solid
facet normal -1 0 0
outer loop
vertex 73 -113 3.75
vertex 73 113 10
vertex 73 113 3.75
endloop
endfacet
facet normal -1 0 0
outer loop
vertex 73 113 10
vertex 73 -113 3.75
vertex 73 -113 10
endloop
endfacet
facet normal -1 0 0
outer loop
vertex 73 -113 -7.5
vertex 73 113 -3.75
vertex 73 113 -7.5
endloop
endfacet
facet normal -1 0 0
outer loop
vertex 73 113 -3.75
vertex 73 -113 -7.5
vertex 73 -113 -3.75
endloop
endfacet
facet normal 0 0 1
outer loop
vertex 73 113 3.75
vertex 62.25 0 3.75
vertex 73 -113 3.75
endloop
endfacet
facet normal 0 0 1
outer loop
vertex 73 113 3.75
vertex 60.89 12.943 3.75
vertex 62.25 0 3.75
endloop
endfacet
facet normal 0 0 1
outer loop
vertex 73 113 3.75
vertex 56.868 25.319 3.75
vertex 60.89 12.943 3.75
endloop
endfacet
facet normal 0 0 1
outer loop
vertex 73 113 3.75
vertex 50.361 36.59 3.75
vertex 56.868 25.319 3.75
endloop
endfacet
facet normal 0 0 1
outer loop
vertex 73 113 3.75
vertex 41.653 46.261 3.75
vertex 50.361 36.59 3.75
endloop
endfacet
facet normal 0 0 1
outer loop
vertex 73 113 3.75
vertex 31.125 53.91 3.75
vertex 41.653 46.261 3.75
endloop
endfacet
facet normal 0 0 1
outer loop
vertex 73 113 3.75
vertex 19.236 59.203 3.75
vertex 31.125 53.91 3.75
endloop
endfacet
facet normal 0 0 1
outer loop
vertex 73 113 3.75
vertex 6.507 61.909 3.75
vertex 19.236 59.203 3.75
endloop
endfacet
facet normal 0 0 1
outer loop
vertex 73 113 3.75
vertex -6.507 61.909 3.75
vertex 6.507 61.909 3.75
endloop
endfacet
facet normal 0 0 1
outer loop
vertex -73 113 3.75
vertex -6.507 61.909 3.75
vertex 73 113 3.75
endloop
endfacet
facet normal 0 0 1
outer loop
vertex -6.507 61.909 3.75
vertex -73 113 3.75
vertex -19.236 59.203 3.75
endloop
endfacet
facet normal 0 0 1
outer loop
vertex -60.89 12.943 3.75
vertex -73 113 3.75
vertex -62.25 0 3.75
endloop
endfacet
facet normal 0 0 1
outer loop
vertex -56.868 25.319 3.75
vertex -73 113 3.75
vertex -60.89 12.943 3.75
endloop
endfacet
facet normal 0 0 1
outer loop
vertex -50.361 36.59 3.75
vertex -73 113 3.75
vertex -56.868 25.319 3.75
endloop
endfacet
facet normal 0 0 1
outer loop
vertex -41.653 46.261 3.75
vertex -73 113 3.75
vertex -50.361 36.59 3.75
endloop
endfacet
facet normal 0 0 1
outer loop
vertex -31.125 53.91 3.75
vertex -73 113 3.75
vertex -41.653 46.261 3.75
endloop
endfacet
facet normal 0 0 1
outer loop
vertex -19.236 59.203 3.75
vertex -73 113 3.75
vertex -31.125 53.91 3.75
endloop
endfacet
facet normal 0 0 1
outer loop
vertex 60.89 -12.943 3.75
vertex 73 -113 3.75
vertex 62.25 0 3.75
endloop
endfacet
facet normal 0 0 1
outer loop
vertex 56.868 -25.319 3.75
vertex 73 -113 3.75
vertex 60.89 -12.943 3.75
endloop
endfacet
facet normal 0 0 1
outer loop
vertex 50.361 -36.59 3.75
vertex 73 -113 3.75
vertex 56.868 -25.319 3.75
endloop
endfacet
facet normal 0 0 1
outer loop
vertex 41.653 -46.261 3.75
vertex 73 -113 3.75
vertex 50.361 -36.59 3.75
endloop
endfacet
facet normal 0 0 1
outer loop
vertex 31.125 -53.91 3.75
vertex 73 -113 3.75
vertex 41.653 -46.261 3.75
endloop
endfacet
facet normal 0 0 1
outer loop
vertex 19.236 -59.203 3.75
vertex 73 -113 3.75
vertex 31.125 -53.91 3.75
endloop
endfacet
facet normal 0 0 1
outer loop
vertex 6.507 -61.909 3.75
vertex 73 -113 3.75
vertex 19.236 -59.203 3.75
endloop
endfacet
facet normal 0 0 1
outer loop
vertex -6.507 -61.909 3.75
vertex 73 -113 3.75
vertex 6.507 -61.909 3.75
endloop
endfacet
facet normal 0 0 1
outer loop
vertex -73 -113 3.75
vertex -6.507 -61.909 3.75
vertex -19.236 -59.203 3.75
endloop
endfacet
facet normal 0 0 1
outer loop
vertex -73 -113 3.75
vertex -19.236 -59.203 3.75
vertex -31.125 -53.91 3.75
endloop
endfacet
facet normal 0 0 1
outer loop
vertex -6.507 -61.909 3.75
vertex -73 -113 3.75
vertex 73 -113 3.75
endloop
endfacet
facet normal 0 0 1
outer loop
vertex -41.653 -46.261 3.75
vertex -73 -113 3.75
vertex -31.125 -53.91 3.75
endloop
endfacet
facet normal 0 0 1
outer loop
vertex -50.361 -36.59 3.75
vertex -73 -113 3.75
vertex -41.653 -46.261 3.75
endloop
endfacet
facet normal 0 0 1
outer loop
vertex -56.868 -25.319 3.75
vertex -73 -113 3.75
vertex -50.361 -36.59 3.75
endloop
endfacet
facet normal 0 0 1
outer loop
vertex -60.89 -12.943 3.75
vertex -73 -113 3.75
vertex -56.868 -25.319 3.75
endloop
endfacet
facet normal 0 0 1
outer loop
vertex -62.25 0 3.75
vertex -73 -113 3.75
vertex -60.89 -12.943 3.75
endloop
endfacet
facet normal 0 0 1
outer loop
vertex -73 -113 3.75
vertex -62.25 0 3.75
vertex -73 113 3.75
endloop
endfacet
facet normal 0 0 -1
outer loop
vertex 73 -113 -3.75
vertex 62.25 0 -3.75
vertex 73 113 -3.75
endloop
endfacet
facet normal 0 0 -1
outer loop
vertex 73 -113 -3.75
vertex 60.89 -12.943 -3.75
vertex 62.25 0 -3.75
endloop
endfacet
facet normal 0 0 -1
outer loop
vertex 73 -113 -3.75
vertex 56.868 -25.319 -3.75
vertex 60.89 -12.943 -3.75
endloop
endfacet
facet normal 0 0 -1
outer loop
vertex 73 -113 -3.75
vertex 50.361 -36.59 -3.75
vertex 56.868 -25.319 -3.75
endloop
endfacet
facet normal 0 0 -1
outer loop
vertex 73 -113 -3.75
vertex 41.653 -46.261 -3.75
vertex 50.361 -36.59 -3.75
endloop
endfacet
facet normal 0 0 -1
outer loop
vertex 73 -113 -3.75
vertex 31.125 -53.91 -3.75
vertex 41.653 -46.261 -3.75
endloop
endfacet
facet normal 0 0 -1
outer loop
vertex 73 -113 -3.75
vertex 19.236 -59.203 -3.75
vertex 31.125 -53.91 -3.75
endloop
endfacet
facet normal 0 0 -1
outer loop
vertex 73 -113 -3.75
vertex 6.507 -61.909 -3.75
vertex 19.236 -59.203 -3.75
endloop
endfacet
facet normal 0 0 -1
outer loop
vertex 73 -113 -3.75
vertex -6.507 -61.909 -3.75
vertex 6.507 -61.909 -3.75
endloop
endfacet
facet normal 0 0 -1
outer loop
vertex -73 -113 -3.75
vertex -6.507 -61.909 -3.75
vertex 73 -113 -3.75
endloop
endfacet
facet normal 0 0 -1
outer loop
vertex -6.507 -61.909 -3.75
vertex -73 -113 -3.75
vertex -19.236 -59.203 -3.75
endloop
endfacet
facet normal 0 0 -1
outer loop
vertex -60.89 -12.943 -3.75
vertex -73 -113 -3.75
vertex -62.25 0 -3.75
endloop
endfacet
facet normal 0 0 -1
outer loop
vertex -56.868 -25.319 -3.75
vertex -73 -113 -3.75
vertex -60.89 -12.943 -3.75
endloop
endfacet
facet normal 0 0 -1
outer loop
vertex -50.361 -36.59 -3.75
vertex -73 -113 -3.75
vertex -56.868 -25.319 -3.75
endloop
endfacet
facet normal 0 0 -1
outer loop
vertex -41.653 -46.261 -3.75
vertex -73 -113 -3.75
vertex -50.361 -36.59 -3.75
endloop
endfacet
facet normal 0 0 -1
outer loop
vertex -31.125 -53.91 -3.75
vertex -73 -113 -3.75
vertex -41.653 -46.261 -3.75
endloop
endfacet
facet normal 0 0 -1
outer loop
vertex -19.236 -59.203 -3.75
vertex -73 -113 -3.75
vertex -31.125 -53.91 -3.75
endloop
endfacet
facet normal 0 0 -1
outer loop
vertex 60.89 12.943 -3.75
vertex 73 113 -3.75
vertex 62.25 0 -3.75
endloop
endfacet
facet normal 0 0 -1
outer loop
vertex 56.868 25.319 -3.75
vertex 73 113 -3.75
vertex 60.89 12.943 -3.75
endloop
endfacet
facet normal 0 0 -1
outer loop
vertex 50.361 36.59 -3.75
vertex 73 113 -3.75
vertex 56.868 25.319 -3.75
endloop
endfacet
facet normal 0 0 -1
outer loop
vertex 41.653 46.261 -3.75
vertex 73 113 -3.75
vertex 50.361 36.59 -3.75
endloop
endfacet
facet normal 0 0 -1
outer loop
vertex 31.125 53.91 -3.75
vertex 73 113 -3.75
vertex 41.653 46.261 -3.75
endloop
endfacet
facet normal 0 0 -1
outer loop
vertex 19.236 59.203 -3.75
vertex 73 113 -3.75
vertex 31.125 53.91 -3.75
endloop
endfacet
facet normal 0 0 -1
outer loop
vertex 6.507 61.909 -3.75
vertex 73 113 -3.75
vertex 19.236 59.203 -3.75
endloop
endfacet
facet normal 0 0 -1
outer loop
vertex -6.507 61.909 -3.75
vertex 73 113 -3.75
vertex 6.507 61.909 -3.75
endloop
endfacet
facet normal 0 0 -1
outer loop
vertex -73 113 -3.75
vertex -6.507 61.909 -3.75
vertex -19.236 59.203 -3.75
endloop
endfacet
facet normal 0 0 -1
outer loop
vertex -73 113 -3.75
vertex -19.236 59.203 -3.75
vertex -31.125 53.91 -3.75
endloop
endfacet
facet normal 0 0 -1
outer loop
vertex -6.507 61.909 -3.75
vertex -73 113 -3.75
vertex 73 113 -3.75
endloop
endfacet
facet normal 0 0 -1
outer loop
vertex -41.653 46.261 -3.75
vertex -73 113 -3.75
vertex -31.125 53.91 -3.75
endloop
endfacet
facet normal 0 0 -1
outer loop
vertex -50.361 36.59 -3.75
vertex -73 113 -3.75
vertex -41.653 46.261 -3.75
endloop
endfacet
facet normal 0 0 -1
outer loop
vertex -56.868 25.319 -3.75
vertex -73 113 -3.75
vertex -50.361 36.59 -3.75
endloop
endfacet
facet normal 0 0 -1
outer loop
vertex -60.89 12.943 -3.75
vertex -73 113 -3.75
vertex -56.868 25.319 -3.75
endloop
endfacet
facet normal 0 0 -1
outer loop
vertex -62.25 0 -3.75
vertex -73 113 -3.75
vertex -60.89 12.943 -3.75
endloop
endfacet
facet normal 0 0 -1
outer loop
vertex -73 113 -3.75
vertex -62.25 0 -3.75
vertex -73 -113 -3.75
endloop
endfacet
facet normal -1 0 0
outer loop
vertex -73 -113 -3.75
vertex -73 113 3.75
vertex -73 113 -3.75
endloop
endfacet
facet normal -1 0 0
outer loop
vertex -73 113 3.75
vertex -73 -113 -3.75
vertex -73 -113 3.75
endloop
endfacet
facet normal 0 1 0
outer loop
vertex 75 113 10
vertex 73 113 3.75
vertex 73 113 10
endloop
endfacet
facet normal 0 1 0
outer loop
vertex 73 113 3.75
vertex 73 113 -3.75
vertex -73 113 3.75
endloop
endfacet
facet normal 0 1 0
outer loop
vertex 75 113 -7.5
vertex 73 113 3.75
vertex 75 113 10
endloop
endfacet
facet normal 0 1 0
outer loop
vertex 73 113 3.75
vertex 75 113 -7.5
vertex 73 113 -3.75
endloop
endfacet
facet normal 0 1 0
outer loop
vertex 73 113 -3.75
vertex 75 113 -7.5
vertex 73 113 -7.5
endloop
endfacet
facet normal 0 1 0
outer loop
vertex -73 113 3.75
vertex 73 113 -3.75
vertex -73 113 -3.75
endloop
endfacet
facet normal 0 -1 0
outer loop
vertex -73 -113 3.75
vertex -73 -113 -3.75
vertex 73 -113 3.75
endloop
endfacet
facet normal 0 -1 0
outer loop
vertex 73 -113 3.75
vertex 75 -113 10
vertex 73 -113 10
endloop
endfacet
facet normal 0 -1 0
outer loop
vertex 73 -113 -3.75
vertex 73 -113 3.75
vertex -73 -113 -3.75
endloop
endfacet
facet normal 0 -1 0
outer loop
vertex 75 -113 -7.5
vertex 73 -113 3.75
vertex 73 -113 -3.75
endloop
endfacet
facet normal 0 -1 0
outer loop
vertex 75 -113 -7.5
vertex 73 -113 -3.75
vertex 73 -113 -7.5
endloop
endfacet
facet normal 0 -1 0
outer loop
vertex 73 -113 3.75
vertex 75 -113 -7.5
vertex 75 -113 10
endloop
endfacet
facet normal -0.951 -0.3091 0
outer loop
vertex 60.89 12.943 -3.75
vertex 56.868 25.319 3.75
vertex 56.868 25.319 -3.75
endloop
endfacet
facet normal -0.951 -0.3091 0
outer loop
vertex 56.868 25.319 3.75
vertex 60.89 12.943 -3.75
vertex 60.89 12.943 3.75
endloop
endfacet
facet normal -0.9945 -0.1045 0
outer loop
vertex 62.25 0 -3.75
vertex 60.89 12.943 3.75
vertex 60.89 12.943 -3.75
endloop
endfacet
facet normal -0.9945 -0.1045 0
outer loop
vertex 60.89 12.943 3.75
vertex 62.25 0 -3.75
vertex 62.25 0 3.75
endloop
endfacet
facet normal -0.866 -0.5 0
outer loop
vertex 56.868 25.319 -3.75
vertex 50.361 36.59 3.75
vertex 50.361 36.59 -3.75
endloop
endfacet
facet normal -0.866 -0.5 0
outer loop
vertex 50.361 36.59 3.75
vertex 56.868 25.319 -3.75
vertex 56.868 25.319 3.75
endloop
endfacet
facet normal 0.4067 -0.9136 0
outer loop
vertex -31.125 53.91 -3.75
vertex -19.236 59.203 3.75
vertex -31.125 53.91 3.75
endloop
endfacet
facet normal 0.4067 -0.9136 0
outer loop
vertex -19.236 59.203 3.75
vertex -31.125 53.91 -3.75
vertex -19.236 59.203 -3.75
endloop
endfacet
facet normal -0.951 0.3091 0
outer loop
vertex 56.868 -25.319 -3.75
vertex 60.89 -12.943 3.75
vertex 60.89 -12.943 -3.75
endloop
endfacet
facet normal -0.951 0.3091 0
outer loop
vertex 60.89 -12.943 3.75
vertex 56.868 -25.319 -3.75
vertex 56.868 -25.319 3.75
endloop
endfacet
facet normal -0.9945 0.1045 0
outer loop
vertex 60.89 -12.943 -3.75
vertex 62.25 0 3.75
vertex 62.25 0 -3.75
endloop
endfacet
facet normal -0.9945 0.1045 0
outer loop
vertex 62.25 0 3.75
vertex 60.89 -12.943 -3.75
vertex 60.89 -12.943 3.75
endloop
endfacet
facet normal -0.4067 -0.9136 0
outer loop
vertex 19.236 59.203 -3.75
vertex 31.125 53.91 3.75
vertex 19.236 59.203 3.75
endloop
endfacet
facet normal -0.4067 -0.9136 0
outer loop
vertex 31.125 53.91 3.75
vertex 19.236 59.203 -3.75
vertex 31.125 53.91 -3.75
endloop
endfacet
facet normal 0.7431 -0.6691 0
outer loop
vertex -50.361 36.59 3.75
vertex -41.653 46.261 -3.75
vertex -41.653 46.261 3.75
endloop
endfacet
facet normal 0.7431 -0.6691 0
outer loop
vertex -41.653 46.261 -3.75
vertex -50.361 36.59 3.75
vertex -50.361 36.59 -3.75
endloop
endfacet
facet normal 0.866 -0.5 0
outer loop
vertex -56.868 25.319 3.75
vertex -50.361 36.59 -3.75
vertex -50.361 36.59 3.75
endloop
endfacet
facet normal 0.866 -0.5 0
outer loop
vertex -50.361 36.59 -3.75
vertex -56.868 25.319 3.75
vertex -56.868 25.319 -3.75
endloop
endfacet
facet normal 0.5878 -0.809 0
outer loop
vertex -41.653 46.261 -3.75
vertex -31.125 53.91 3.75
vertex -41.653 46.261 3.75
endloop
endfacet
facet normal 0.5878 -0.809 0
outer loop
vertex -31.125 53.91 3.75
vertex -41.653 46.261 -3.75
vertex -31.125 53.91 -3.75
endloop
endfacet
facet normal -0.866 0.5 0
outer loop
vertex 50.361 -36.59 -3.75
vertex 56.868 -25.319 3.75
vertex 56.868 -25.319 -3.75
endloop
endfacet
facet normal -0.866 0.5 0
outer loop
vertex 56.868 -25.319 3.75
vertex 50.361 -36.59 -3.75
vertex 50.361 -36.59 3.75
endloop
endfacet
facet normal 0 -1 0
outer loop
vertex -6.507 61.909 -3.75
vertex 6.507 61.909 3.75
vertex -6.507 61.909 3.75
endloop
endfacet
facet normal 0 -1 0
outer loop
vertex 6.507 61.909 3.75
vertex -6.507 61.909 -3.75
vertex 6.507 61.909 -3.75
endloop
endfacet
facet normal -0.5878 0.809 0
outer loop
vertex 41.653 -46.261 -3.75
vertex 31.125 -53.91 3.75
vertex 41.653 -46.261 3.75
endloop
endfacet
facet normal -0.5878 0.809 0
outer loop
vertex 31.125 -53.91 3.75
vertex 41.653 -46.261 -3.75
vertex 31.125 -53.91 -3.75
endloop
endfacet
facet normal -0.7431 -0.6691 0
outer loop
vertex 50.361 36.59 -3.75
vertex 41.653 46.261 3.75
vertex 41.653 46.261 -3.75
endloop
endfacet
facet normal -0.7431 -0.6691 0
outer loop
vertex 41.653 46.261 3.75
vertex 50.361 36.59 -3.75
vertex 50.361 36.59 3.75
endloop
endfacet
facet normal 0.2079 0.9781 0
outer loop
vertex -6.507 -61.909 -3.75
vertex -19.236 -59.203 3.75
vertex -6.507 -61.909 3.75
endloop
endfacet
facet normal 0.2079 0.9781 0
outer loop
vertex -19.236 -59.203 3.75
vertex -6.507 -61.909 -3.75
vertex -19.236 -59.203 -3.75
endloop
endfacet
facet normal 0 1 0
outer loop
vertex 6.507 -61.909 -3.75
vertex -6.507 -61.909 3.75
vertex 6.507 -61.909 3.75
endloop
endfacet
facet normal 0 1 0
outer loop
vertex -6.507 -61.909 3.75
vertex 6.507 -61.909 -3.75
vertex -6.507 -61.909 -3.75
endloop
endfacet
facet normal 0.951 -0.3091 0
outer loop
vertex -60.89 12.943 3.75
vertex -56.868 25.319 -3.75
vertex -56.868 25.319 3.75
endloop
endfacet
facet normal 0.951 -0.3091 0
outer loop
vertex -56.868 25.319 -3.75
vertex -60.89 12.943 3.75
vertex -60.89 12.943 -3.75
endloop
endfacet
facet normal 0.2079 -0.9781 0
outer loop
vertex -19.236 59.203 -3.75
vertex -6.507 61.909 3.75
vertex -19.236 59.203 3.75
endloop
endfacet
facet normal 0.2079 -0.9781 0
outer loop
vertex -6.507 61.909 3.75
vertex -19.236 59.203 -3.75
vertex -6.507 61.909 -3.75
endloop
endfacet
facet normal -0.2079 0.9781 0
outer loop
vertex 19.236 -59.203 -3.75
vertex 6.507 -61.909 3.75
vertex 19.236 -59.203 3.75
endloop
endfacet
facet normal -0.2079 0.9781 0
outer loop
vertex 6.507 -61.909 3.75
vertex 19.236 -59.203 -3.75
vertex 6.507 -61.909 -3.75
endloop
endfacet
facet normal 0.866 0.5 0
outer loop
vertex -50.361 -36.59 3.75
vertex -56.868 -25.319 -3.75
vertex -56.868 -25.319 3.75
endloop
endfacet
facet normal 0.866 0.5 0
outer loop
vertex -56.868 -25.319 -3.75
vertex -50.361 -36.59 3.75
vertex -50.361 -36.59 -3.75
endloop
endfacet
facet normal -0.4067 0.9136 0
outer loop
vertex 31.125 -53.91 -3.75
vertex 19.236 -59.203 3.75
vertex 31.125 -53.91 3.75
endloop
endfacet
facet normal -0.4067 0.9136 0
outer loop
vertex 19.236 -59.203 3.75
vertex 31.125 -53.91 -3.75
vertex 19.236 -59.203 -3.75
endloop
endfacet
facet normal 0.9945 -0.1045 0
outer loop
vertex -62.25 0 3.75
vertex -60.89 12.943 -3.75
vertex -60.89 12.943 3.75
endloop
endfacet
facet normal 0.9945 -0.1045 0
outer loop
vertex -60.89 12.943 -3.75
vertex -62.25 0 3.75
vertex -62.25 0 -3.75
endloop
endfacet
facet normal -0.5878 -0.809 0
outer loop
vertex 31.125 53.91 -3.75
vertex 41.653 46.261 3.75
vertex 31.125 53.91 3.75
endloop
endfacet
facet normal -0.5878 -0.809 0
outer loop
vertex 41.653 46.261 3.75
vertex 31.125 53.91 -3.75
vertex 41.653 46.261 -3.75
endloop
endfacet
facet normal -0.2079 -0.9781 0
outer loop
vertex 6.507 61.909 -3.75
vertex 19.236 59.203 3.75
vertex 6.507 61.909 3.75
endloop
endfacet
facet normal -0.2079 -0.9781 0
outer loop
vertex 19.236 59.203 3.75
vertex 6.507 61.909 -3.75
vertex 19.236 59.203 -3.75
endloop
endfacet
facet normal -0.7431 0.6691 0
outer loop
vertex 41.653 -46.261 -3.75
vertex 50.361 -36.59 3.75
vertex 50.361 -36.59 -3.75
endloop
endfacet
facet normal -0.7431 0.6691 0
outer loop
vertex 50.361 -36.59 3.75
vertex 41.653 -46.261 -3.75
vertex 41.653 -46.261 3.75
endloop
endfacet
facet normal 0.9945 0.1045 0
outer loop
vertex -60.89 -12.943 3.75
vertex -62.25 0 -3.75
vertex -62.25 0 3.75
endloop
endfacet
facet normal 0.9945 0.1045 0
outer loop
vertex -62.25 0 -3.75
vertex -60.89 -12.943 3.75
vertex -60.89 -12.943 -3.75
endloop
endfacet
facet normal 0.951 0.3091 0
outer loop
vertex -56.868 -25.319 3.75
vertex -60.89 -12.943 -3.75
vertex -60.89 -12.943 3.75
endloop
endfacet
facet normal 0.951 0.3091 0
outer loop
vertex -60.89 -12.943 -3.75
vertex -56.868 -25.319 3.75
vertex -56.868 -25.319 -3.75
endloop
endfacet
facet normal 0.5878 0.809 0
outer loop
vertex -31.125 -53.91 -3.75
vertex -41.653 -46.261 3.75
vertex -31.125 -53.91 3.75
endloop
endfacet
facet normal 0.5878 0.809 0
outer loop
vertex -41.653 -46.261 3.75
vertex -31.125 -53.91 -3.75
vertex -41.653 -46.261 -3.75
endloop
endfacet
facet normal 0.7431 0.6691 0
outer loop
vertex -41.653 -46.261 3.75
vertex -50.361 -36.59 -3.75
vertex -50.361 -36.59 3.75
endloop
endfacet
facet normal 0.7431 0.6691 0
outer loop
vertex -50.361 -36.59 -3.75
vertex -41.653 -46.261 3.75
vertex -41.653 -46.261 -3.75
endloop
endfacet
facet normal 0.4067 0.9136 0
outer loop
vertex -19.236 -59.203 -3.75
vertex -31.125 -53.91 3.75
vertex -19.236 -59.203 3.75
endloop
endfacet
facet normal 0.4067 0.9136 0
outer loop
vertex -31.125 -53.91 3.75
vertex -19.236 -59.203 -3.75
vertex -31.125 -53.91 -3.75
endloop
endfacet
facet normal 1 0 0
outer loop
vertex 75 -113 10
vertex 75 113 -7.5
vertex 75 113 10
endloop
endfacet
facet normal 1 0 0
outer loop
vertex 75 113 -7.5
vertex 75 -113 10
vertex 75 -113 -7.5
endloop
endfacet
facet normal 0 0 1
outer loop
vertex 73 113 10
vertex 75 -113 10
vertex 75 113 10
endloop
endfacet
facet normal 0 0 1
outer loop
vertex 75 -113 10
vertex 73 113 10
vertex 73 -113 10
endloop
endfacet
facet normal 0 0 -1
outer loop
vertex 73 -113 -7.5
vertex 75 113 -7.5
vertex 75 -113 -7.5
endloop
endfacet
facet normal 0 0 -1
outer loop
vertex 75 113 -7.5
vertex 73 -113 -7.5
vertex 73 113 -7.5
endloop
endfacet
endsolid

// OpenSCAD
// hangar
cupholderDiameter = 124.5;
cupholderHeight = 7.5;
armWidth = 146;
armWings = 40;
armBridgeWidth = armWidth + (armWings * 2);

// The top part with the cupholder cutout
difference() {
    cube([armWidth, armBridgeWidth, cupholderHeight], center = true);
    cylinder(cupholderHeight, d=cupholderDiameter, center = true);
}

// Wings to hold it on the arm
wingHeight = cupholderHeight + 10;
wingWidth = 2;
translate([armWidth / 2,-(armBridgeWidth / 2),-(cupholderHeight)]){
    cube([wingWidth, armBridgeWidth, wingHeight], false);
}
